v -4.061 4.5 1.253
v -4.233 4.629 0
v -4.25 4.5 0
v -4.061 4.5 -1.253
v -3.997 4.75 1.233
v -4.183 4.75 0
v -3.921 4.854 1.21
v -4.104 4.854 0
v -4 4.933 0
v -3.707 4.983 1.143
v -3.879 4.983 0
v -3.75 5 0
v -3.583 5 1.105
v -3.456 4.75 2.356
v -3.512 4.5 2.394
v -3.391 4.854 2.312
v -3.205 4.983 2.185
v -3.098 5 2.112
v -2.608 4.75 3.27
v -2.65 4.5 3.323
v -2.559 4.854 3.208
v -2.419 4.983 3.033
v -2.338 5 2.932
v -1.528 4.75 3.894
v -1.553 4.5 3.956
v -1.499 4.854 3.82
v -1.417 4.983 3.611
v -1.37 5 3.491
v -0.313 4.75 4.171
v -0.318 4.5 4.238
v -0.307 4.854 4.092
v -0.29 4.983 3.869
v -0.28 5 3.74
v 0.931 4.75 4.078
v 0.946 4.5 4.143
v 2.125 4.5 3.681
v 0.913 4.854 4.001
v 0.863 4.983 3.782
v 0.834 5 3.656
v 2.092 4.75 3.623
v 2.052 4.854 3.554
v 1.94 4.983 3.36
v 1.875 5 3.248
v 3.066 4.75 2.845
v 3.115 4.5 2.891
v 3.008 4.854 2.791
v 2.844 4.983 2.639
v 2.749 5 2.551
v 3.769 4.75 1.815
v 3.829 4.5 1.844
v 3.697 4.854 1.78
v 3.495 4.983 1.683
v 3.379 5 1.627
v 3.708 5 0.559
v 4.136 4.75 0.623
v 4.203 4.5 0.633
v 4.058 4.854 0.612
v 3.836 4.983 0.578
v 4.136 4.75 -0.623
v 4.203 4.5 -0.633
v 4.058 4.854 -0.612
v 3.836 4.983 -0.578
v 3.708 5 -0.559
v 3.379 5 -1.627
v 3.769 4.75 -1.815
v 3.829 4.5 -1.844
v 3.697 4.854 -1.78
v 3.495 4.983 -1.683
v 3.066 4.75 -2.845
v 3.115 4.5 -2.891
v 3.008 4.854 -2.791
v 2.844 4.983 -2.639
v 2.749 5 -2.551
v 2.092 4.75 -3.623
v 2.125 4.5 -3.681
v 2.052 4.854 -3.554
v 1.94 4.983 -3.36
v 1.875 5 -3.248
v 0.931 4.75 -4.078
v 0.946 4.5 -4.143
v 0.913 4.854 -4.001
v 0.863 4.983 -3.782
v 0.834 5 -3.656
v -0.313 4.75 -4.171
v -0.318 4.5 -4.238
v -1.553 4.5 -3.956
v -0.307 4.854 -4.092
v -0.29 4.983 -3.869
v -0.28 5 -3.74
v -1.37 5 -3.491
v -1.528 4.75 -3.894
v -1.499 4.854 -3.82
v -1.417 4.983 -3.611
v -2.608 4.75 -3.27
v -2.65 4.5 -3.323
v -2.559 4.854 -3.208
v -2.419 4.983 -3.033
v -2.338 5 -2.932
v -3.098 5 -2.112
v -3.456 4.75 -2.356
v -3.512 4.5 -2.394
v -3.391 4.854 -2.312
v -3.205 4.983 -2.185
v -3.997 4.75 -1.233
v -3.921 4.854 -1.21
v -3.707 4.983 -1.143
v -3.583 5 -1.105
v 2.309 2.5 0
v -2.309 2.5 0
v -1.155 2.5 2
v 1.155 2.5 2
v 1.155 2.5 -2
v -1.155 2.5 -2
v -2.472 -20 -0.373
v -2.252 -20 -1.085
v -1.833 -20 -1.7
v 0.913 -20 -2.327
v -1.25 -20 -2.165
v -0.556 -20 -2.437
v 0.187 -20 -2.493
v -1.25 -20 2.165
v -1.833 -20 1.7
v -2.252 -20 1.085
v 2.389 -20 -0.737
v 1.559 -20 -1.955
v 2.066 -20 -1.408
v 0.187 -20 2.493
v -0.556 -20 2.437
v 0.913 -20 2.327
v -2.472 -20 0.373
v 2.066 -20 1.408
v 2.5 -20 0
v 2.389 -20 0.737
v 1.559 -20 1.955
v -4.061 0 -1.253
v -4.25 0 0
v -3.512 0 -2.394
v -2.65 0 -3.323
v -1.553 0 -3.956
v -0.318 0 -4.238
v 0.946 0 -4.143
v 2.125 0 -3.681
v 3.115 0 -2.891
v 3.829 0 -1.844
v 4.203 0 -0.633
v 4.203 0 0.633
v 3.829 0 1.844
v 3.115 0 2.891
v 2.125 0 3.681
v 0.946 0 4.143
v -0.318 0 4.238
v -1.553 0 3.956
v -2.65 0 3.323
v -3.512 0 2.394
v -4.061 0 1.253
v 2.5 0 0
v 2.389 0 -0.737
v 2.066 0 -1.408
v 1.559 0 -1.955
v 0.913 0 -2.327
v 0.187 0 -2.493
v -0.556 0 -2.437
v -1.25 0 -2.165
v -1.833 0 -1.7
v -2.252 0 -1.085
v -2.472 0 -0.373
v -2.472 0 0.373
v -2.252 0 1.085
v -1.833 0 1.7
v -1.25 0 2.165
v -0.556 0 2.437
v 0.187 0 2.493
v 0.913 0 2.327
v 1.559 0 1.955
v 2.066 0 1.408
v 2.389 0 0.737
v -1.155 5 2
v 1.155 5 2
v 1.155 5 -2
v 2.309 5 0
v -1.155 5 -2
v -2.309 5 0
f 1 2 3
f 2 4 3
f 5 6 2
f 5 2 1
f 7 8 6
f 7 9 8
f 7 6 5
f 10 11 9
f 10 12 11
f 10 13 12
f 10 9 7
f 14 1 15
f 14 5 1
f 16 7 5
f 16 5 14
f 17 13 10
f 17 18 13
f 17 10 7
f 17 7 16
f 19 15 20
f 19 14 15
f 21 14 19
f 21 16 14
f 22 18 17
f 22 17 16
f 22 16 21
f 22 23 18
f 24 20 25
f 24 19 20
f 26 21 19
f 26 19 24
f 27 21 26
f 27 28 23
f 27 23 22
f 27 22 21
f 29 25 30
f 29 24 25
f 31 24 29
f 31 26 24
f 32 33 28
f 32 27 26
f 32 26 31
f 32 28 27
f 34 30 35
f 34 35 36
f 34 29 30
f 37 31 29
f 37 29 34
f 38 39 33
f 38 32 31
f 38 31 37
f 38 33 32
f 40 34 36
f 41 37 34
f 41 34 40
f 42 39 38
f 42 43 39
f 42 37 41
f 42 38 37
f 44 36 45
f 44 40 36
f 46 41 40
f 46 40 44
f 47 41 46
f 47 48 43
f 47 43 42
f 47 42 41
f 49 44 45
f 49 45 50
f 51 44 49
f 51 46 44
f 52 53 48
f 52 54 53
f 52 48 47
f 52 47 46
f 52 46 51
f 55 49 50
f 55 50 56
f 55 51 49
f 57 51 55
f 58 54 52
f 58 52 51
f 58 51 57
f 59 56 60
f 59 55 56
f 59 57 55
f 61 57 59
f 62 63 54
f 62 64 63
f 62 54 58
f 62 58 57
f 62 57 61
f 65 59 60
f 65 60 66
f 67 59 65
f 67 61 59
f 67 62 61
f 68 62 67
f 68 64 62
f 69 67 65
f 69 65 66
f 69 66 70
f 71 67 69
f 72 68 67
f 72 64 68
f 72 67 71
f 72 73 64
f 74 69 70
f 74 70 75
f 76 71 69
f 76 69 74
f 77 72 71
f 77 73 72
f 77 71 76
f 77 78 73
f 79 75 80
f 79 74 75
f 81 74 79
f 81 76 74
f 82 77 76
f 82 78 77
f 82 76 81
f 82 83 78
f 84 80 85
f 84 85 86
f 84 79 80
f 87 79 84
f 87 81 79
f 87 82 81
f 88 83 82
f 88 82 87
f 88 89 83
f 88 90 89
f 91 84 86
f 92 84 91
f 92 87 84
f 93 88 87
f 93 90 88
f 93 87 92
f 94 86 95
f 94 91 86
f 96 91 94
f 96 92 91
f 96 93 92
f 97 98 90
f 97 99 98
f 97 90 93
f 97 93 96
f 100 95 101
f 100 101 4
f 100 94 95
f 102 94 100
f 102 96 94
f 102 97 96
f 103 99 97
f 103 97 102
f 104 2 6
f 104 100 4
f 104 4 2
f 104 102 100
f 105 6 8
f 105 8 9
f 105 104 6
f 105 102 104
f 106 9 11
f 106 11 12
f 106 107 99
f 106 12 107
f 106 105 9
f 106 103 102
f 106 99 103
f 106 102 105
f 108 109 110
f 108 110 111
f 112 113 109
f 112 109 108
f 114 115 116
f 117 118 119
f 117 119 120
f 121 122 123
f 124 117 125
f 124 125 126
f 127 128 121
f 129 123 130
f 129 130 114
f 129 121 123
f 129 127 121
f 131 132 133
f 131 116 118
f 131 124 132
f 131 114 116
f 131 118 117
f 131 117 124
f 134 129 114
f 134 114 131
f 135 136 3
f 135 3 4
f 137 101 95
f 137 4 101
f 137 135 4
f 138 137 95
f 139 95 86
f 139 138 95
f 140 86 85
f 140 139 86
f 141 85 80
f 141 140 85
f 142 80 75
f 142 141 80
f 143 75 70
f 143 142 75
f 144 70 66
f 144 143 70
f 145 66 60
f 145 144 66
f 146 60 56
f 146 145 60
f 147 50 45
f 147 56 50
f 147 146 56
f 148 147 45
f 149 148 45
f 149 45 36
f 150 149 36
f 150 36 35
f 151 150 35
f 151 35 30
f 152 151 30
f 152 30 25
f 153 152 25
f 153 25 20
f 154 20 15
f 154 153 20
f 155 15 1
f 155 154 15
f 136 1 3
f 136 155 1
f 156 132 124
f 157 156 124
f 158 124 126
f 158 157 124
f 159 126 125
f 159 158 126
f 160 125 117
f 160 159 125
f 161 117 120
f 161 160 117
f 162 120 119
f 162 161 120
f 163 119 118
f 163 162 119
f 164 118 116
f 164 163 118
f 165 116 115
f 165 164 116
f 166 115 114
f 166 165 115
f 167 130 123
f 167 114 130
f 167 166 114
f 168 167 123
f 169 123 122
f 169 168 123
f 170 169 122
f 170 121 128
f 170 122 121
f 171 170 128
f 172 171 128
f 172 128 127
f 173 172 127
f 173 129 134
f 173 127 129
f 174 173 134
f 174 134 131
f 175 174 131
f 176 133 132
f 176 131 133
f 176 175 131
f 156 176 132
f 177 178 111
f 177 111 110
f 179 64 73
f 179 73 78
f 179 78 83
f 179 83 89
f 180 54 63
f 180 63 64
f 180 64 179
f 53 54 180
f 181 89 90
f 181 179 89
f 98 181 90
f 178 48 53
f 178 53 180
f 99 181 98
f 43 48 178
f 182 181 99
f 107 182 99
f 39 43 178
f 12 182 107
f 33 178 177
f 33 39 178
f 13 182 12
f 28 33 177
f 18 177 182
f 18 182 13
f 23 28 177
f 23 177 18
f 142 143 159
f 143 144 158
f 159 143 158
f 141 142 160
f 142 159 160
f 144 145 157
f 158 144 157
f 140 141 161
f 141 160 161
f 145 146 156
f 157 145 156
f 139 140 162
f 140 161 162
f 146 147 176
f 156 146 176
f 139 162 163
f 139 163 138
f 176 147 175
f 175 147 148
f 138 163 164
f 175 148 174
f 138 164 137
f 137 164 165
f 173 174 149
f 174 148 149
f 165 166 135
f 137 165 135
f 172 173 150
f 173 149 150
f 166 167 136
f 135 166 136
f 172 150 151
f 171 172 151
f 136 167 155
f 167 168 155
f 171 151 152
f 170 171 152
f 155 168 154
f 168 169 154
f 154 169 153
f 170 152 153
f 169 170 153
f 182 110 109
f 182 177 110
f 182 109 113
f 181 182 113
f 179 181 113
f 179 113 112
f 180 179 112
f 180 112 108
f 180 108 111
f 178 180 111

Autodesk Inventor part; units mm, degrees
ref_plane "YZ Plane" through (0, 0, 0) normal (1, 0, 0) x (0, 1, 0)
ref_plane "XZ Plane" through (0, 0, 0) normal (0, 1, 0) x (-1, 0, 0)
ref_plane "XY Plane" through (0, 0, 0) normal (0, 0, 1) x (1, 0, 0)
sketch "Cap Cross Section" plane through (0, 0, 0) normal (0, 1, 0) x (-1, 0, 0)
  circle A0 centre (0, 0) radius 4.25
  dimension "d0" = 8.5
extrude "Cap" add sketch "Cap Cross Section" along normal blind 5
sketch "Key Socket Cutout Outline" plane through (0, 5, 0) normal (0, 1, 0) x (1, 0, 0)
  line L0 (1.1547, 2) -> (2.3094, 0)
  line L1 (2.3094, 0) -> (1.1547, -2)
  line L2 (1.1547, -2) -> (-1.1547, -2)
  line L3 (-1.1547, -2) -> (-2.3094, 0)
  line L4 (-2.3094, 0) -> (-1.1547, 2)
  line L5 (-1.1547, 2) -> (1.1547, 2)
  point P0 (0, 0)
  point P1 (0, 0)
  dimension "d3" = 4
extrude "Key Socket Cutout" cut sketch "Key Socket Cutout Outline" against normal blind 2.5
sketch "Body Cross Section" plane through (0, 0, 0) normal (0, -1, 0) x (1, 0, 0)
  circle A0 centre (0, 0) radius 2.5
  dimension "d6" = 5
extrude "Body" add sketch "Body Cross Section" along normal blind 20
thread "Thread" size "M5x0.8" class "6g" standard "ANSI Metric M Profile" full length
fillet "Cap Fillet" radius 0.5 1 edges at (4.25, 5, 0)
properties part number "SSCF-M5-20-A4" material "Stainless Steel AISI 317"
